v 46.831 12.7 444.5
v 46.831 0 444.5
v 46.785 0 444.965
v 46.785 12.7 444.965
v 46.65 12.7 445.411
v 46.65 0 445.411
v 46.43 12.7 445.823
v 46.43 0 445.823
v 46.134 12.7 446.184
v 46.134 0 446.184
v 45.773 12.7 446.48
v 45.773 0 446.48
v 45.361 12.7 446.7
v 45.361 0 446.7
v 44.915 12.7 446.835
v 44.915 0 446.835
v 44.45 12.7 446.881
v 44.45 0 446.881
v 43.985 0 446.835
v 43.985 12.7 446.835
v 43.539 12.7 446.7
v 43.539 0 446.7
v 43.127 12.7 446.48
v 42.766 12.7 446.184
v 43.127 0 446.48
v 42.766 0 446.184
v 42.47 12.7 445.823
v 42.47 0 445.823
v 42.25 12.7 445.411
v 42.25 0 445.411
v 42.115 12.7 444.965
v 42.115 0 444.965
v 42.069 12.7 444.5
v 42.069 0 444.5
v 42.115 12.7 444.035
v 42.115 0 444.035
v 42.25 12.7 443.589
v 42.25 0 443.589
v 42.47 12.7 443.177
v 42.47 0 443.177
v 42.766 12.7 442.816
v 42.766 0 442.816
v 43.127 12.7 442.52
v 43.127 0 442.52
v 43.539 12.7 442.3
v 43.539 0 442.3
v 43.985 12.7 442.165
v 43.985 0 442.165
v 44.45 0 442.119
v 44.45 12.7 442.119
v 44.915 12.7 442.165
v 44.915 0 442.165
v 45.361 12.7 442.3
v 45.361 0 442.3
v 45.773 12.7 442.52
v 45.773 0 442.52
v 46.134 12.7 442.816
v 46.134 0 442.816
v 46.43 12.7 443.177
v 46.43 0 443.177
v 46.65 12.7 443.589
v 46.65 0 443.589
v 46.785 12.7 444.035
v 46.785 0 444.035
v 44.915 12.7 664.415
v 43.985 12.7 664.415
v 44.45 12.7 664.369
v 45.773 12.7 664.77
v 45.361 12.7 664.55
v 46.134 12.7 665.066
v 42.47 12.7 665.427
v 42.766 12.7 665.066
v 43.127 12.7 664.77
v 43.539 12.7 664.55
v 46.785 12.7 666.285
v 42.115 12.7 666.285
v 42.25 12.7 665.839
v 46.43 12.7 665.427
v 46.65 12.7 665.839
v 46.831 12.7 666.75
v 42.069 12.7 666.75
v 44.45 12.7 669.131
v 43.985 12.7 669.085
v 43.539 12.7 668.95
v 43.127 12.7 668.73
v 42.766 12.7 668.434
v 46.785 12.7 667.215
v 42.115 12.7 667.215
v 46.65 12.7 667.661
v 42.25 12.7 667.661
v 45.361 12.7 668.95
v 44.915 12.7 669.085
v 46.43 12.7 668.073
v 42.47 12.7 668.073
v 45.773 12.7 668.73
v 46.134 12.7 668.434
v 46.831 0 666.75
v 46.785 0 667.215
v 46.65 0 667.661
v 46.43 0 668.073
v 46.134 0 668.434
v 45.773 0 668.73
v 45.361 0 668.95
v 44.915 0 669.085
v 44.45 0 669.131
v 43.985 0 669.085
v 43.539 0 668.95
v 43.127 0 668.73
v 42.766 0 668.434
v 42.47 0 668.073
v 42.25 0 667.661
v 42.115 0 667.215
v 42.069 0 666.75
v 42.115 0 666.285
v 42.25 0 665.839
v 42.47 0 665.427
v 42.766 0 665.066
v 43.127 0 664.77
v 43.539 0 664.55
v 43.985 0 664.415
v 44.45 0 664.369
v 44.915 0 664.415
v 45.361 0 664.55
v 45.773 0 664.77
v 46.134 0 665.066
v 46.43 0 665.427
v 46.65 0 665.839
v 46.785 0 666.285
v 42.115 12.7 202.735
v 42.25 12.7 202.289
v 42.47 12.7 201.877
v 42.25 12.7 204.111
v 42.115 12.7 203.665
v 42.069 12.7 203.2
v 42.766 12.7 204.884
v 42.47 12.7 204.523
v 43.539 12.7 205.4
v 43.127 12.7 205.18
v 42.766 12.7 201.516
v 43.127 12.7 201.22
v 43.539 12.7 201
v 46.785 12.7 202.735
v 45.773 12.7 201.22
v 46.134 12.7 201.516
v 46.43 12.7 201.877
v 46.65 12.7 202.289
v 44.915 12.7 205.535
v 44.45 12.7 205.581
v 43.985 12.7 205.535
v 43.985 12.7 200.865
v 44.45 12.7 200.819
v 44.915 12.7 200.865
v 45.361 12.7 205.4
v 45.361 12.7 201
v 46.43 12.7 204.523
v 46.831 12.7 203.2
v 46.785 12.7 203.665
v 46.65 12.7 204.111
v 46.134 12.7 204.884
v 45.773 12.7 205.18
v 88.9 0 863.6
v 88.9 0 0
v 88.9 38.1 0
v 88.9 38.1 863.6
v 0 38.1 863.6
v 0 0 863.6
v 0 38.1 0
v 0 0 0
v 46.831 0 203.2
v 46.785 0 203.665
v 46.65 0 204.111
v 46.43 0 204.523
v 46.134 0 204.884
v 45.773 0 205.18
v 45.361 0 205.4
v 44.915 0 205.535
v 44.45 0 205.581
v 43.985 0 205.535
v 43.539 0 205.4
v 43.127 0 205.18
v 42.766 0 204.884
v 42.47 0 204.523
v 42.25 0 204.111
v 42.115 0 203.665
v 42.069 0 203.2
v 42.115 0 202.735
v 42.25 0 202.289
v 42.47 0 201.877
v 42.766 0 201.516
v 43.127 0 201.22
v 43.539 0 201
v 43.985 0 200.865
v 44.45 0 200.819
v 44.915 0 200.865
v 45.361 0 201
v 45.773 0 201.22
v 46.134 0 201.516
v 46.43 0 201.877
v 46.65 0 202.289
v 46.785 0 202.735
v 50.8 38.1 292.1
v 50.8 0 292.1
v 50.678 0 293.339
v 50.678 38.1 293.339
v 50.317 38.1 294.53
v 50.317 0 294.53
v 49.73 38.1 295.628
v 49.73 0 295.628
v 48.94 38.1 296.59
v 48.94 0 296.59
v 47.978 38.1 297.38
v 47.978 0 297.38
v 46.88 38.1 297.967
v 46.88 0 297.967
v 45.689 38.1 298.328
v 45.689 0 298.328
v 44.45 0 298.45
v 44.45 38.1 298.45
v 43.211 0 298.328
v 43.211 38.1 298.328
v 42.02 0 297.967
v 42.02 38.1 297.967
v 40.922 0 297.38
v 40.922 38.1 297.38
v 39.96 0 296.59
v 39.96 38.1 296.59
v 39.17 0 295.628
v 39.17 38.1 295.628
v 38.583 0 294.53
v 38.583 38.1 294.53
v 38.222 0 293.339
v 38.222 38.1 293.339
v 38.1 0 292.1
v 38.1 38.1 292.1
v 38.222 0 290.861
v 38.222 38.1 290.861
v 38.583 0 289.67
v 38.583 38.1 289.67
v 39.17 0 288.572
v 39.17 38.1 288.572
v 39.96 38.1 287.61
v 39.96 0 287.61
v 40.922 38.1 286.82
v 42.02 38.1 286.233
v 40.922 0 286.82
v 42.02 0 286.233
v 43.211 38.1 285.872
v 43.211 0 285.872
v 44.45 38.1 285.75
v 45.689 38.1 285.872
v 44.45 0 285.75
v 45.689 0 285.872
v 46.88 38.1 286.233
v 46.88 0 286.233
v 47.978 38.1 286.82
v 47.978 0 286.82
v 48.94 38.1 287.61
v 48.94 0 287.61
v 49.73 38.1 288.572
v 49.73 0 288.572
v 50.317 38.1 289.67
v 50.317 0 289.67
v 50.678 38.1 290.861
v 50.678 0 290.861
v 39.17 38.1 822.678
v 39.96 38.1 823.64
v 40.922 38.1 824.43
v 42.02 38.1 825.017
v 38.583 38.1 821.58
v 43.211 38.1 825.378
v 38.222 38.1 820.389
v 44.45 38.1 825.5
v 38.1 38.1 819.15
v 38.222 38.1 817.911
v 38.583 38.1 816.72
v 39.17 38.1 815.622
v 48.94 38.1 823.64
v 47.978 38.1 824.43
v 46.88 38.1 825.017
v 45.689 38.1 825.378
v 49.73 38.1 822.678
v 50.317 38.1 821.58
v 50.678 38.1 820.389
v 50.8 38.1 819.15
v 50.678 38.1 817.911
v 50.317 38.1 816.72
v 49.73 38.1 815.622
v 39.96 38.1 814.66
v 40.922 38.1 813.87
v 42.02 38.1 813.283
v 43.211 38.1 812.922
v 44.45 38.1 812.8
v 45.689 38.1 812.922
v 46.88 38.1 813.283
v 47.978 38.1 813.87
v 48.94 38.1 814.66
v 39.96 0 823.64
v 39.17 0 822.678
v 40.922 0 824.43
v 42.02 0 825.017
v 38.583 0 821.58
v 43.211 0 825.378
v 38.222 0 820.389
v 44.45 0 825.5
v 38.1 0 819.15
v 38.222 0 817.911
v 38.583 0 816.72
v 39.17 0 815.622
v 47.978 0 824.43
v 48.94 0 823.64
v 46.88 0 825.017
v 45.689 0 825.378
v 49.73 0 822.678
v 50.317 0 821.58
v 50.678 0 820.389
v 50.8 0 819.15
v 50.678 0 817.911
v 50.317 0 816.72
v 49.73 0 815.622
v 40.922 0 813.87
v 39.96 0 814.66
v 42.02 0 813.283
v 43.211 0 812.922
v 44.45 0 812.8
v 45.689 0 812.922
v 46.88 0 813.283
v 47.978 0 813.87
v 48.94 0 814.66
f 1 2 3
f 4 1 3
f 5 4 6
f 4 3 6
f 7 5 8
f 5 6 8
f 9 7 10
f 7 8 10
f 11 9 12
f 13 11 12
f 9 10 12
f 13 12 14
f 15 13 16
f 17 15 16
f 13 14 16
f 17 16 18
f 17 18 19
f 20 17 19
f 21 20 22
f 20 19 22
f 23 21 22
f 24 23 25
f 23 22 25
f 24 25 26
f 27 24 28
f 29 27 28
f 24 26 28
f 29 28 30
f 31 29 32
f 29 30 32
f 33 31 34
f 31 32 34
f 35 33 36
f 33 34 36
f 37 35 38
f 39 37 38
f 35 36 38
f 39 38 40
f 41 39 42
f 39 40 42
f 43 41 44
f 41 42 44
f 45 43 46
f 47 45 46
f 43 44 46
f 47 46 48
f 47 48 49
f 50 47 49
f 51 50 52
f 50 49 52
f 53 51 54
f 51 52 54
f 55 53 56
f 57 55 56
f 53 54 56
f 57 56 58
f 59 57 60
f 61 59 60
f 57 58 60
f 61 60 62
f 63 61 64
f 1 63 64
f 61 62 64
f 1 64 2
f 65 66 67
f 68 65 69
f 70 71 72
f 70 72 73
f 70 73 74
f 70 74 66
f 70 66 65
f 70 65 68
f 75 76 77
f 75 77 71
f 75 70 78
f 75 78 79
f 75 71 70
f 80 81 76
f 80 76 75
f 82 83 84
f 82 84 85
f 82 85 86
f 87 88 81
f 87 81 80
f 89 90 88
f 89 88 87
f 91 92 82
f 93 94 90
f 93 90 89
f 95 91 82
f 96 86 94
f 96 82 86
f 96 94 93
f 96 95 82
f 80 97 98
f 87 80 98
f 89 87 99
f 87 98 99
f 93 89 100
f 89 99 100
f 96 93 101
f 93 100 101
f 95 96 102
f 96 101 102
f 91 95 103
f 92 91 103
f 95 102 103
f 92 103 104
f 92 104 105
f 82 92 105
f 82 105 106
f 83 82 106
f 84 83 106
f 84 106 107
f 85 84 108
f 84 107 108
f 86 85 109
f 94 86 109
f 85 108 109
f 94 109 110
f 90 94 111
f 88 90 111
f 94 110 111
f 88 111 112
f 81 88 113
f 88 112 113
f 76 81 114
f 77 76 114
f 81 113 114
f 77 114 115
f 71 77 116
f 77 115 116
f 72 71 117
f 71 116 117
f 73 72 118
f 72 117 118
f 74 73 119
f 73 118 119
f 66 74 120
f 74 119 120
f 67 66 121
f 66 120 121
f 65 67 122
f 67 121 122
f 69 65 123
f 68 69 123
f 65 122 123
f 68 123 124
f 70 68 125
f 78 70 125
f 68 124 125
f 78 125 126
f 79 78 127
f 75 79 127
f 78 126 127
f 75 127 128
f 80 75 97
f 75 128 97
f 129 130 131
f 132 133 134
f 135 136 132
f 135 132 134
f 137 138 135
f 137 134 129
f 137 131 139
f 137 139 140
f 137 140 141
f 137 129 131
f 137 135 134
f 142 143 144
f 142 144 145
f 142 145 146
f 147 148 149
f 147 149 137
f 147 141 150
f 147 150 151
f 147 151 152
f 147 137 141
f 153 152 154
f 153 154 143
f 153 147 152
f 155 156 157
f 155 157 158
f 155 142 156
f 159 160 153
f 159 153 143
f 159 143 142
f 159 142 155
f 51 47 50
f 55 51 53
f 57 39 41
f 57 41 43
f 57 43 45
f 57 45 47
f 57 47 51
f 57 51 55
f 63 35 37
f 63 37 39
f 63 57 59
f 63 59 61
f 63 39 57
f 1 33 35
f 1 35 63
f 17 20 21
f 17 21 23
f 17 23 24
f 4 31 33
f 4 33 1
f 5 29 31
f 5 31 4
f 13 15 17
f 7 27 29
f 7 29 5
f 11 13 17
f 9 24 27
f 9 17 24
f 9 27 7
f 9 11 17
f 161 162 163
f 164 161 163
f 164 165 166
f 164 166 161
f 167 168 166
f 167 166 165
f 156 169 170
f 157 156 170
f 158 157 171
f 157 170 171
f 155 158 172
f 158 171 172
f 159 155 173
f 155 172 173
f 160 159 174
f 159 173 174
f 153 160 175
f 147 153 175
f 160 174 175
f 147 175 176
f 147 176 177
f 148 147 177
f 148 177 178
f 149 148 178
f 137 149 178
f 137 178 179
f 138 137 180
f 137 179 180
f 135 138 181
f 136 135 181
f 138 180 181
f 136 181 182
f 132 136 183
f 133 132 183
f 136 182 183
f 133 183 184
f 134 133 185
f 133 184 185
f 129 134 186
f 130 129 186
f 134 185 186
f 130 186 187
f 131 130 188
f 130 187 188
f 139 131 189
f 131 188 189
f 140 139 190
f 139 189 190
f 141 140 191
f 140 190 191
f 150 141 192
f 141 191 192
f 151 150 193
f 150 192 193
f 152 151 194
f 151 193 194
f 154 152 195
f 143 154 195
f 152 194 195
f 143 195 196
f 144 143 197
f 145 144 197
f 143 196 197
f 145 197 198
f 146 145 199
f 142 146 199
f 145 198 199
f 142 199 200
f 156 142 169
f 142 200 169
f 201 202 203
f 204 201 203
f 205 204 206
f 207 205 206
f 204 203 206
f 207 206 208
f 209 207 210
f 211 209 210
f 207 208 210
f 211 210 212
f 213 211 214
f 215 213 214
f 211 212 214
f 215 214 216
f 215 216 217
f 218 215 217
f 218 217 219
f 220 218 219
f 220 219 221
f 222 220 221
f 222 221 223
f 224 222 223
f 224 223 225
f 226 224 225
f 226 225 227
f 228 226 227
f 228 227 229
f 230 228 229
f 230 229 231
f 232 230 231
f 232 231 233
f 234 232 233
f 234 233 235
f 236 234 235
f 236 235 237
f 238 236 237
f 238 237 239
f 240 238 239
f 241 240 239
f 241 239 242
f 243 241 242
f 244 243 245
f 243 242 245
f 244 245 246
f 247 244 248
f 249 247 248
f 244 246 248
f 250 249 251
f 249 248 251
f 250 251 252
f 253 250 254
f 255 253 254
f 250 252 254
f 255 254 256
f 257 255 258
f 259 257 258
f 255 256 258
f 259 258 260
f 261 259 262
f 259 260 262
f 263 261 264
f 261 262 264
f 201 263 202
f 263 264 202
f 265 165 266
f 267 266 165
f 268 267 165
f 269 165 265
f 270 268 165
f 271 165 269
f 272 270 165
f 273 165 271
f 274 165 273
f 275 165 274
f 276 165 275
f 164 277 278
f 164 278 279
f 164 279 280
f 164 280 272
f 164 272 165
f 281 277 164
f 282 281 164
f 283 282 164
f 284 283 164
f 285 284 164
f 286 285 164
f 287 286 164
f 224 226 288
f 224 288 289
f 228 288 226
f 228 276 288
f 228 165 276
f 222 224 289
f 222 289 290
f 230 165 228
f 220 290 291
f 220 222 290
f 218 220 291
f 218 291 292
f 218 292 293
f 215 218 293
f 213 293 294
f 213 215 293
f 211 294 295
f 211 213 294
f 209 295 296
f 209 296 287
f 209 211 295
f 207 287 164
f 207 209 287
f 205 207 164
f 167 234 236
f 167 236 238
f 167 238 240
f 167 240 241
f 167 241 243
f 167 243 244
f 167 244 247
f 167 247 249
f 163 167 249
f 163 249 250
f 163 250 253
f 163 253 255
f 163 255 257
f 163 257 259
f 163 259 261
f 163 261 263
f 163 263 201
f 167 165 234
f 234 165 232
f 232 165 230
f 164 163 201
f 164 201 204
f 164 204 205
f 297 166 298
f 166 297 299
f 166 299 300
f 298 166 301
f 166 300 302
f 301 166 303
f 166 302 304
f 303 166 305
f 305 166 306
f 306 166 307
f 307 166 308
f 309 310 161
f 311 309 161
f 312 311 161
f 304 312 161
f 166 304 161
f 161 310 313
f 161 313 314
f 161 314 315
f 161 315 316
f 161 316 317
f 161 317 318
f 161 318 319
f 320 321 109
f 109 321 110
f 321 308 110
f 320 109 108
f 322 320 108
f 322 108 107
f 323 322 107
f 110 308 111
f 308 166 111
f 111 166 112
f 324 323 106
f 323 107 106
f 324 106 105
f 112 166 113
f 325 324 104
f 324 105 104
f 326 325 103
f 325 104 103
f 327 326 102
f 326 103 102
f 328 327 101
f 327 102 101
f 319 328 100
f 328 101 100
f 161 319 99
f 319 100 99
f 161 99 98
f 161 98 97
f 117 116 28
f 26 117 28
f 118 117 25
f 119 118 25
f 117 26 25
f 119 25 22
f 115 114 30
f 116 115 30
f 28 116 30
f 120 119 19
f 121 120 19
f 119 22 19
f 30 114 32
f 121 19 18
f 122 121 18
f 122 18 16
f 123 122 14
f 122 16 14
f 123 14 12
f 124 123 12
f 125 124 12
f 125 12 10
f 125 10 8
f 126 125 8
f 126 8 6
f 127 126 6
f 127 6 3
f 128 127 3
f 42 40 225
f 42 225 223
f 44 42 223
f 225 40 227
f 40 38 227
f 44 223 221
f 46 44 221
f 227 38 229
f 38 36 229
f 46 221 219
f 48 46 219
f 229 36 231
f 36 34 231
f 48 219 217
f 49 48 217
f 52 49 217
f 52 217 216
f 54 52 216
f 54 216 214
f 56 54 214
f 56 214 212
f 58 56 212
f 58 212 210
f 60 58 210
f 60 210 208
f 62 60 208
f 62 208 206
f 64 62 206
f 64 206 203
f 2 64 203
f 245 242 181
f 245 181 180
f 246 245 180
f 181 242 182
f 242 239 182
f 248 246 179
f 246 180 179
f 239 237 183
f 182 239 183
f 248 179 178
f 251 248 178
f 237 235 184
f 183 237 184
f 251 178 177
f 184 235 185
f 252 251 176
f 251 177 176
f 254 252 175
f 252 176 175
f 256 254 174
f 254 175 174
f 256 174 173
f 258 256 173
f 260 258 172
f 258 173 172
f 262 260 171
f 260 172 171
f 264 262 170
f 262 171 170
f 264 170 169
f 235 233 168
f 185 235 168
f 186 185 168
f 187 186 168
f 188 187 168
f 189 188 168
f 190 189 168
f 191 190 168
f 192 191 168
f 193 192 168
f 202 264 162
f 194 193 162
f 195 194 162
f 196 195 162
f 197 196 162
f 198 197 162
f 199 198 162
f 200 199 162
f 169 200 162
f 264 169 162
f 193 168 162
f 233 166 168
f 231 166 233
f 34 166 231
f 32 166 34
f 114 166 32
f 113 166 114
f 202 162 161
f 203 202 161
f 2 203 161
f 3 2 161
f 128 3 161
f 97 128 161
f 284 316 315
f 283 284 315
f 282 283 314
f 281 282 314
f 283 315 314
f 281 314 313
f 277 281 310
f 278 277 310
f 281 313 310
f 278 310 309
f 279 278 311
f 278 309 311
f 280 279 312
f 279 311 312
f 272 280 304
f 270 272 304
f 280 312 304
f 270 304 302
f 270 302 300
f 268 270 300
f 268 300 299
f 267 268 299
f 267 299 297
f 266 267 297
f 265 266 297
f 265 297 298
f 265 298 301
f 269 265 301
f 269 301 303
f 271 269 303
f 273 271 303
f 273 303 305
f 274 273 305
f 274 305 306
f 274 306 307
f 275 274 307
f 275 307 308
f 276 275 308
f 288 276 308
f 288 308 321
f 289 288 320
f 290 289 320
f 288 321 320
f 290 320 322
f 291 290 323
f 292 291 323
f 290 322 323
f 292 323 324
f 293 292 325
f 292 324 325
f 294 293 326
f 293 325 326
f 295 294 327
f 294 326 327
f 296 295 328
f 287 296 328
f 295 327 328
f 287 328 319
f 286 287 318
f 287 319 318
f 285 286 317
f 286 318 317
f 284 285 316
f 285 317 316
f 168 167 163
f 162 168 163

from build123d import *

# Parameters (mm, degrees)
SKETCH002_AS_DRAWN_R                 = 2.38125
EXTRUDE002_DEPTH                     = 12.7
EXTRUDE002_ONTO_SKETCH002_ROLL_ANGLE = 90
SKETCH001_AS_DRAWN_R                 = 6.35
EXTRUDE001_DEPTH                     = 50.8
EXTRUDE001_ONTO_SKETCH001_ROLL_ANGLE = 90
SKETCH_W                             = 88.9
SKETCH_H                             = 38.1
EXTRUDE_DEPTH                        = 863.6


with BuildPart() as extrude002:
    # Sketch002 as drawn → Extrude002 (new)
    with BuildSketch(Plane.XY):
        with Locations((44.45, 203.2)):
            Circle(SKETCH002_AS_DRAWN_R)
        with Locations((44.45, 666.75)):
            Circle(SKETCH002_AS_DRAWN_R)
        with Locations((44.45, 444.5)):
            Circle(SKETCH002_AS_DRAWN_R)
    extrude(amount=-EXTRUDE002_DEPTH)


with BuildPart() as extrude002_1:
    # Extrude002 onto Sketch002 roll: moved
    add(extrude002.part.rotate(Axis((0, 0, 0), (1, 0, 0)), EXTRUDE002_ONTO_SKETCH002_ROLL_ANGLE))


with BuildPart() as extrude002_2:
    # Extrude002 onto Sketch002 placement: moved
    add(extrude002_1.part)


with BuildPart() as extrude001:
    # Sketch001 as drawn → Extrude001 (new)
    with BuildSketch(Plane.XY):
        with Locations((44.45, 292.1)):
            Circle(SKETCH001_AS_DRAWN_R)
        with Locations((44.45, 819.15)):
            Circle(SKETCH001_AS_DRAWN_R)
    extrude(amount=-EXTRUDE001_DEPTH)


with BuildPart() as extrude001_1:
    # Extrude001 onto Sketch001 roll: moved
    add(extrude001.part.rotate(Axis((0, 0, 0), (1, 0, 0)), EXTRUDE001_ONTO_SKETCH001_ROLL_ANGLE))


with BuildPart() as extrude001_2:
    # Extrude001 onto Sketch001 placement: moved
    add(extrude001_1.part)


with BuildPart() as cut001:
    # Sketch → Extrude (new body)
    with BuildSketch(Plane.XY):
        with Locations((44.45, 19.05)):
            Rectangle(SKETCH_W, SKETCH_H)
    extrude(amount=EXTRUDE_DEPTH)

    # Cut: cut Extrude001
    add(extrude001_2.part, mode=Mode.SUBTRACT)

    # Cut001: cut Extrude002
    add(extrude002_2.part, mode=Mode.SUBTRACT)


solid = cut001.part
